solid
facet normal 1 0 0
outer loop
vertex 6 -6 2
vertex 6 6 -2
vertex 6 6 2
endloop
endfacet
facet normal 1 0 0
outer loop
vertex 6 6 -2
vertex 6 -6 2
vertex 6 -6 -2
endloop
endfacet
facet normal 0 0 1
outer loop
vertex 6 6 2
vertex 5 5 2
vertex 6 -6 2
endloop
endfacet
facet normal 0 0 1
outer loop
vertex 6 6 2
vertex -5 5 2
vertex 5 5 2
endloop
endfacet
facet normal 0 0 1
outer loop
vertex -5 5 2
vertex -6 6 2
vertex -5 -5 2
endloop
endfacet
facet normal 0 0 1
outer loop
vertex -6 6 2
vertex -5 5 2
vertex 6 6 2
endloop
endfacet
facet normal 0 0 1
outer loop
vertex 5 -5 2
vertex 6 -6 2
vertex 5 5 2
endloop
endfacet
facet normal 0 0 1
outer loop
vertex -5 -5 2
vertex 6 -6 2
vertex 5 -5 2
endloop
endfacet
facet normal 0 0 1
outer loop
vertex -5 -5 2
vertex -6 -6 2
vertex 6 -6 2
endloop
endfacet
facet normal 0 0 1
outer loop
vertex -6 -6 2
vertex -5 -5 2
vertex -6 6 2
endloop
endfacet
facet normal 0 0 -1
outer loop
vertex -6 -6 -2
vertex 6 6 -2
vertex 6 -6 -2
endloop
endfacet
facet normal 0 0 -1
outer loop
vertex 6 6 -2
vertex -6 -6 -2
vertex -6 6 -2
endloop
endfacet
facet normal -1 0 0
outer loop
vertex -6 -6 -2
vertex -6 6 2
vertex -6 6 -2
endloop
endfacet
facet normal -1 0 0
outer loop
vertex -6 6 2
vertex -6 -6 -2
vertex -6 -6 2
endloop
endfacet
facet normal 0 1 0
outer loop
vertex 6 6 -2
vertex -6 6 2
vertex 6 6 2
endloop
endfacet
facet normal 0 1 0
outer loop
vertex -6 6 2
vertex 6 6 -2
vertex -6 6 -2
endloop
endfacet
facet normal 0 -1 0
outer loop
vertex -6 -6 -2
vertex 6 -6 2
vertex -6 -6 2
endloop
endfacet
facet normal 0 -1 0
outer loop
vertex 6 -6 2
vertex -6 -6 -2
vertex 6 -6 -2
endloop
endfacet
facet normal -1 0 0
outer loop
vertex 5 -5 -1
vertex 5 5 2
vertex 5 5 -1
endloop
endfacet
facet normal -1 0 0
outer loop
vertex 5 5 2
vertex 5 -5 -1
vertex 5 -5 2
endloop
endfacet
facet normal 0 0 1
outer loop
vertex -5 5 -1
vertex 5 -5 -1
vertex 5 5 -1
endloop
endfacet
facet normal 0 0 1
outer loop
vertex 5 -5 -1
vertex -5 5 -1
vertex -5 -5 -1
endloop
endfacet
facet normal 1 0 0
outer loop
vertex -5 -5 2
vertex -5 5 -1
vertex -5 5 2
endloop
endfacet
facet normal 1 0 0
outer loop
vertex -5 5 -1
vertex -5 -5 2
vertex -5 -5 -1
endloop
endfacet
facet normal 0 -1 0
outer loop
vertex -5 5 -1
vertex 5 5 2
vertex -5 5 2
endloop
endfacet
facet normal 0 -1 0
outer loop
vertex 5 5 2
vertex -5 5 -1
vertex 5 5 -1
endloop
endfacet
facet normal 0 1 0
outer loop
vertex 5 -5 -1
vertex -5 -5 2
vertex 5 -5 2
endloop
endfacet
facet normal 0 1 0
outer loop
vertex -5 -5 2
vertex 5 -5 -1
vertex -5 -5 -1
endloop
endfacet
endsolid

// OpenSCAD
// need to figure out a inside / outside poyine + extrusion

height = 4;

difference() { 

  cube([12,12,height], center = true);


  translate( [ 0,0,+3]) { 
    color( "red") {
       cube([10,10, height * 2], center = true);
      } 
  }
}
